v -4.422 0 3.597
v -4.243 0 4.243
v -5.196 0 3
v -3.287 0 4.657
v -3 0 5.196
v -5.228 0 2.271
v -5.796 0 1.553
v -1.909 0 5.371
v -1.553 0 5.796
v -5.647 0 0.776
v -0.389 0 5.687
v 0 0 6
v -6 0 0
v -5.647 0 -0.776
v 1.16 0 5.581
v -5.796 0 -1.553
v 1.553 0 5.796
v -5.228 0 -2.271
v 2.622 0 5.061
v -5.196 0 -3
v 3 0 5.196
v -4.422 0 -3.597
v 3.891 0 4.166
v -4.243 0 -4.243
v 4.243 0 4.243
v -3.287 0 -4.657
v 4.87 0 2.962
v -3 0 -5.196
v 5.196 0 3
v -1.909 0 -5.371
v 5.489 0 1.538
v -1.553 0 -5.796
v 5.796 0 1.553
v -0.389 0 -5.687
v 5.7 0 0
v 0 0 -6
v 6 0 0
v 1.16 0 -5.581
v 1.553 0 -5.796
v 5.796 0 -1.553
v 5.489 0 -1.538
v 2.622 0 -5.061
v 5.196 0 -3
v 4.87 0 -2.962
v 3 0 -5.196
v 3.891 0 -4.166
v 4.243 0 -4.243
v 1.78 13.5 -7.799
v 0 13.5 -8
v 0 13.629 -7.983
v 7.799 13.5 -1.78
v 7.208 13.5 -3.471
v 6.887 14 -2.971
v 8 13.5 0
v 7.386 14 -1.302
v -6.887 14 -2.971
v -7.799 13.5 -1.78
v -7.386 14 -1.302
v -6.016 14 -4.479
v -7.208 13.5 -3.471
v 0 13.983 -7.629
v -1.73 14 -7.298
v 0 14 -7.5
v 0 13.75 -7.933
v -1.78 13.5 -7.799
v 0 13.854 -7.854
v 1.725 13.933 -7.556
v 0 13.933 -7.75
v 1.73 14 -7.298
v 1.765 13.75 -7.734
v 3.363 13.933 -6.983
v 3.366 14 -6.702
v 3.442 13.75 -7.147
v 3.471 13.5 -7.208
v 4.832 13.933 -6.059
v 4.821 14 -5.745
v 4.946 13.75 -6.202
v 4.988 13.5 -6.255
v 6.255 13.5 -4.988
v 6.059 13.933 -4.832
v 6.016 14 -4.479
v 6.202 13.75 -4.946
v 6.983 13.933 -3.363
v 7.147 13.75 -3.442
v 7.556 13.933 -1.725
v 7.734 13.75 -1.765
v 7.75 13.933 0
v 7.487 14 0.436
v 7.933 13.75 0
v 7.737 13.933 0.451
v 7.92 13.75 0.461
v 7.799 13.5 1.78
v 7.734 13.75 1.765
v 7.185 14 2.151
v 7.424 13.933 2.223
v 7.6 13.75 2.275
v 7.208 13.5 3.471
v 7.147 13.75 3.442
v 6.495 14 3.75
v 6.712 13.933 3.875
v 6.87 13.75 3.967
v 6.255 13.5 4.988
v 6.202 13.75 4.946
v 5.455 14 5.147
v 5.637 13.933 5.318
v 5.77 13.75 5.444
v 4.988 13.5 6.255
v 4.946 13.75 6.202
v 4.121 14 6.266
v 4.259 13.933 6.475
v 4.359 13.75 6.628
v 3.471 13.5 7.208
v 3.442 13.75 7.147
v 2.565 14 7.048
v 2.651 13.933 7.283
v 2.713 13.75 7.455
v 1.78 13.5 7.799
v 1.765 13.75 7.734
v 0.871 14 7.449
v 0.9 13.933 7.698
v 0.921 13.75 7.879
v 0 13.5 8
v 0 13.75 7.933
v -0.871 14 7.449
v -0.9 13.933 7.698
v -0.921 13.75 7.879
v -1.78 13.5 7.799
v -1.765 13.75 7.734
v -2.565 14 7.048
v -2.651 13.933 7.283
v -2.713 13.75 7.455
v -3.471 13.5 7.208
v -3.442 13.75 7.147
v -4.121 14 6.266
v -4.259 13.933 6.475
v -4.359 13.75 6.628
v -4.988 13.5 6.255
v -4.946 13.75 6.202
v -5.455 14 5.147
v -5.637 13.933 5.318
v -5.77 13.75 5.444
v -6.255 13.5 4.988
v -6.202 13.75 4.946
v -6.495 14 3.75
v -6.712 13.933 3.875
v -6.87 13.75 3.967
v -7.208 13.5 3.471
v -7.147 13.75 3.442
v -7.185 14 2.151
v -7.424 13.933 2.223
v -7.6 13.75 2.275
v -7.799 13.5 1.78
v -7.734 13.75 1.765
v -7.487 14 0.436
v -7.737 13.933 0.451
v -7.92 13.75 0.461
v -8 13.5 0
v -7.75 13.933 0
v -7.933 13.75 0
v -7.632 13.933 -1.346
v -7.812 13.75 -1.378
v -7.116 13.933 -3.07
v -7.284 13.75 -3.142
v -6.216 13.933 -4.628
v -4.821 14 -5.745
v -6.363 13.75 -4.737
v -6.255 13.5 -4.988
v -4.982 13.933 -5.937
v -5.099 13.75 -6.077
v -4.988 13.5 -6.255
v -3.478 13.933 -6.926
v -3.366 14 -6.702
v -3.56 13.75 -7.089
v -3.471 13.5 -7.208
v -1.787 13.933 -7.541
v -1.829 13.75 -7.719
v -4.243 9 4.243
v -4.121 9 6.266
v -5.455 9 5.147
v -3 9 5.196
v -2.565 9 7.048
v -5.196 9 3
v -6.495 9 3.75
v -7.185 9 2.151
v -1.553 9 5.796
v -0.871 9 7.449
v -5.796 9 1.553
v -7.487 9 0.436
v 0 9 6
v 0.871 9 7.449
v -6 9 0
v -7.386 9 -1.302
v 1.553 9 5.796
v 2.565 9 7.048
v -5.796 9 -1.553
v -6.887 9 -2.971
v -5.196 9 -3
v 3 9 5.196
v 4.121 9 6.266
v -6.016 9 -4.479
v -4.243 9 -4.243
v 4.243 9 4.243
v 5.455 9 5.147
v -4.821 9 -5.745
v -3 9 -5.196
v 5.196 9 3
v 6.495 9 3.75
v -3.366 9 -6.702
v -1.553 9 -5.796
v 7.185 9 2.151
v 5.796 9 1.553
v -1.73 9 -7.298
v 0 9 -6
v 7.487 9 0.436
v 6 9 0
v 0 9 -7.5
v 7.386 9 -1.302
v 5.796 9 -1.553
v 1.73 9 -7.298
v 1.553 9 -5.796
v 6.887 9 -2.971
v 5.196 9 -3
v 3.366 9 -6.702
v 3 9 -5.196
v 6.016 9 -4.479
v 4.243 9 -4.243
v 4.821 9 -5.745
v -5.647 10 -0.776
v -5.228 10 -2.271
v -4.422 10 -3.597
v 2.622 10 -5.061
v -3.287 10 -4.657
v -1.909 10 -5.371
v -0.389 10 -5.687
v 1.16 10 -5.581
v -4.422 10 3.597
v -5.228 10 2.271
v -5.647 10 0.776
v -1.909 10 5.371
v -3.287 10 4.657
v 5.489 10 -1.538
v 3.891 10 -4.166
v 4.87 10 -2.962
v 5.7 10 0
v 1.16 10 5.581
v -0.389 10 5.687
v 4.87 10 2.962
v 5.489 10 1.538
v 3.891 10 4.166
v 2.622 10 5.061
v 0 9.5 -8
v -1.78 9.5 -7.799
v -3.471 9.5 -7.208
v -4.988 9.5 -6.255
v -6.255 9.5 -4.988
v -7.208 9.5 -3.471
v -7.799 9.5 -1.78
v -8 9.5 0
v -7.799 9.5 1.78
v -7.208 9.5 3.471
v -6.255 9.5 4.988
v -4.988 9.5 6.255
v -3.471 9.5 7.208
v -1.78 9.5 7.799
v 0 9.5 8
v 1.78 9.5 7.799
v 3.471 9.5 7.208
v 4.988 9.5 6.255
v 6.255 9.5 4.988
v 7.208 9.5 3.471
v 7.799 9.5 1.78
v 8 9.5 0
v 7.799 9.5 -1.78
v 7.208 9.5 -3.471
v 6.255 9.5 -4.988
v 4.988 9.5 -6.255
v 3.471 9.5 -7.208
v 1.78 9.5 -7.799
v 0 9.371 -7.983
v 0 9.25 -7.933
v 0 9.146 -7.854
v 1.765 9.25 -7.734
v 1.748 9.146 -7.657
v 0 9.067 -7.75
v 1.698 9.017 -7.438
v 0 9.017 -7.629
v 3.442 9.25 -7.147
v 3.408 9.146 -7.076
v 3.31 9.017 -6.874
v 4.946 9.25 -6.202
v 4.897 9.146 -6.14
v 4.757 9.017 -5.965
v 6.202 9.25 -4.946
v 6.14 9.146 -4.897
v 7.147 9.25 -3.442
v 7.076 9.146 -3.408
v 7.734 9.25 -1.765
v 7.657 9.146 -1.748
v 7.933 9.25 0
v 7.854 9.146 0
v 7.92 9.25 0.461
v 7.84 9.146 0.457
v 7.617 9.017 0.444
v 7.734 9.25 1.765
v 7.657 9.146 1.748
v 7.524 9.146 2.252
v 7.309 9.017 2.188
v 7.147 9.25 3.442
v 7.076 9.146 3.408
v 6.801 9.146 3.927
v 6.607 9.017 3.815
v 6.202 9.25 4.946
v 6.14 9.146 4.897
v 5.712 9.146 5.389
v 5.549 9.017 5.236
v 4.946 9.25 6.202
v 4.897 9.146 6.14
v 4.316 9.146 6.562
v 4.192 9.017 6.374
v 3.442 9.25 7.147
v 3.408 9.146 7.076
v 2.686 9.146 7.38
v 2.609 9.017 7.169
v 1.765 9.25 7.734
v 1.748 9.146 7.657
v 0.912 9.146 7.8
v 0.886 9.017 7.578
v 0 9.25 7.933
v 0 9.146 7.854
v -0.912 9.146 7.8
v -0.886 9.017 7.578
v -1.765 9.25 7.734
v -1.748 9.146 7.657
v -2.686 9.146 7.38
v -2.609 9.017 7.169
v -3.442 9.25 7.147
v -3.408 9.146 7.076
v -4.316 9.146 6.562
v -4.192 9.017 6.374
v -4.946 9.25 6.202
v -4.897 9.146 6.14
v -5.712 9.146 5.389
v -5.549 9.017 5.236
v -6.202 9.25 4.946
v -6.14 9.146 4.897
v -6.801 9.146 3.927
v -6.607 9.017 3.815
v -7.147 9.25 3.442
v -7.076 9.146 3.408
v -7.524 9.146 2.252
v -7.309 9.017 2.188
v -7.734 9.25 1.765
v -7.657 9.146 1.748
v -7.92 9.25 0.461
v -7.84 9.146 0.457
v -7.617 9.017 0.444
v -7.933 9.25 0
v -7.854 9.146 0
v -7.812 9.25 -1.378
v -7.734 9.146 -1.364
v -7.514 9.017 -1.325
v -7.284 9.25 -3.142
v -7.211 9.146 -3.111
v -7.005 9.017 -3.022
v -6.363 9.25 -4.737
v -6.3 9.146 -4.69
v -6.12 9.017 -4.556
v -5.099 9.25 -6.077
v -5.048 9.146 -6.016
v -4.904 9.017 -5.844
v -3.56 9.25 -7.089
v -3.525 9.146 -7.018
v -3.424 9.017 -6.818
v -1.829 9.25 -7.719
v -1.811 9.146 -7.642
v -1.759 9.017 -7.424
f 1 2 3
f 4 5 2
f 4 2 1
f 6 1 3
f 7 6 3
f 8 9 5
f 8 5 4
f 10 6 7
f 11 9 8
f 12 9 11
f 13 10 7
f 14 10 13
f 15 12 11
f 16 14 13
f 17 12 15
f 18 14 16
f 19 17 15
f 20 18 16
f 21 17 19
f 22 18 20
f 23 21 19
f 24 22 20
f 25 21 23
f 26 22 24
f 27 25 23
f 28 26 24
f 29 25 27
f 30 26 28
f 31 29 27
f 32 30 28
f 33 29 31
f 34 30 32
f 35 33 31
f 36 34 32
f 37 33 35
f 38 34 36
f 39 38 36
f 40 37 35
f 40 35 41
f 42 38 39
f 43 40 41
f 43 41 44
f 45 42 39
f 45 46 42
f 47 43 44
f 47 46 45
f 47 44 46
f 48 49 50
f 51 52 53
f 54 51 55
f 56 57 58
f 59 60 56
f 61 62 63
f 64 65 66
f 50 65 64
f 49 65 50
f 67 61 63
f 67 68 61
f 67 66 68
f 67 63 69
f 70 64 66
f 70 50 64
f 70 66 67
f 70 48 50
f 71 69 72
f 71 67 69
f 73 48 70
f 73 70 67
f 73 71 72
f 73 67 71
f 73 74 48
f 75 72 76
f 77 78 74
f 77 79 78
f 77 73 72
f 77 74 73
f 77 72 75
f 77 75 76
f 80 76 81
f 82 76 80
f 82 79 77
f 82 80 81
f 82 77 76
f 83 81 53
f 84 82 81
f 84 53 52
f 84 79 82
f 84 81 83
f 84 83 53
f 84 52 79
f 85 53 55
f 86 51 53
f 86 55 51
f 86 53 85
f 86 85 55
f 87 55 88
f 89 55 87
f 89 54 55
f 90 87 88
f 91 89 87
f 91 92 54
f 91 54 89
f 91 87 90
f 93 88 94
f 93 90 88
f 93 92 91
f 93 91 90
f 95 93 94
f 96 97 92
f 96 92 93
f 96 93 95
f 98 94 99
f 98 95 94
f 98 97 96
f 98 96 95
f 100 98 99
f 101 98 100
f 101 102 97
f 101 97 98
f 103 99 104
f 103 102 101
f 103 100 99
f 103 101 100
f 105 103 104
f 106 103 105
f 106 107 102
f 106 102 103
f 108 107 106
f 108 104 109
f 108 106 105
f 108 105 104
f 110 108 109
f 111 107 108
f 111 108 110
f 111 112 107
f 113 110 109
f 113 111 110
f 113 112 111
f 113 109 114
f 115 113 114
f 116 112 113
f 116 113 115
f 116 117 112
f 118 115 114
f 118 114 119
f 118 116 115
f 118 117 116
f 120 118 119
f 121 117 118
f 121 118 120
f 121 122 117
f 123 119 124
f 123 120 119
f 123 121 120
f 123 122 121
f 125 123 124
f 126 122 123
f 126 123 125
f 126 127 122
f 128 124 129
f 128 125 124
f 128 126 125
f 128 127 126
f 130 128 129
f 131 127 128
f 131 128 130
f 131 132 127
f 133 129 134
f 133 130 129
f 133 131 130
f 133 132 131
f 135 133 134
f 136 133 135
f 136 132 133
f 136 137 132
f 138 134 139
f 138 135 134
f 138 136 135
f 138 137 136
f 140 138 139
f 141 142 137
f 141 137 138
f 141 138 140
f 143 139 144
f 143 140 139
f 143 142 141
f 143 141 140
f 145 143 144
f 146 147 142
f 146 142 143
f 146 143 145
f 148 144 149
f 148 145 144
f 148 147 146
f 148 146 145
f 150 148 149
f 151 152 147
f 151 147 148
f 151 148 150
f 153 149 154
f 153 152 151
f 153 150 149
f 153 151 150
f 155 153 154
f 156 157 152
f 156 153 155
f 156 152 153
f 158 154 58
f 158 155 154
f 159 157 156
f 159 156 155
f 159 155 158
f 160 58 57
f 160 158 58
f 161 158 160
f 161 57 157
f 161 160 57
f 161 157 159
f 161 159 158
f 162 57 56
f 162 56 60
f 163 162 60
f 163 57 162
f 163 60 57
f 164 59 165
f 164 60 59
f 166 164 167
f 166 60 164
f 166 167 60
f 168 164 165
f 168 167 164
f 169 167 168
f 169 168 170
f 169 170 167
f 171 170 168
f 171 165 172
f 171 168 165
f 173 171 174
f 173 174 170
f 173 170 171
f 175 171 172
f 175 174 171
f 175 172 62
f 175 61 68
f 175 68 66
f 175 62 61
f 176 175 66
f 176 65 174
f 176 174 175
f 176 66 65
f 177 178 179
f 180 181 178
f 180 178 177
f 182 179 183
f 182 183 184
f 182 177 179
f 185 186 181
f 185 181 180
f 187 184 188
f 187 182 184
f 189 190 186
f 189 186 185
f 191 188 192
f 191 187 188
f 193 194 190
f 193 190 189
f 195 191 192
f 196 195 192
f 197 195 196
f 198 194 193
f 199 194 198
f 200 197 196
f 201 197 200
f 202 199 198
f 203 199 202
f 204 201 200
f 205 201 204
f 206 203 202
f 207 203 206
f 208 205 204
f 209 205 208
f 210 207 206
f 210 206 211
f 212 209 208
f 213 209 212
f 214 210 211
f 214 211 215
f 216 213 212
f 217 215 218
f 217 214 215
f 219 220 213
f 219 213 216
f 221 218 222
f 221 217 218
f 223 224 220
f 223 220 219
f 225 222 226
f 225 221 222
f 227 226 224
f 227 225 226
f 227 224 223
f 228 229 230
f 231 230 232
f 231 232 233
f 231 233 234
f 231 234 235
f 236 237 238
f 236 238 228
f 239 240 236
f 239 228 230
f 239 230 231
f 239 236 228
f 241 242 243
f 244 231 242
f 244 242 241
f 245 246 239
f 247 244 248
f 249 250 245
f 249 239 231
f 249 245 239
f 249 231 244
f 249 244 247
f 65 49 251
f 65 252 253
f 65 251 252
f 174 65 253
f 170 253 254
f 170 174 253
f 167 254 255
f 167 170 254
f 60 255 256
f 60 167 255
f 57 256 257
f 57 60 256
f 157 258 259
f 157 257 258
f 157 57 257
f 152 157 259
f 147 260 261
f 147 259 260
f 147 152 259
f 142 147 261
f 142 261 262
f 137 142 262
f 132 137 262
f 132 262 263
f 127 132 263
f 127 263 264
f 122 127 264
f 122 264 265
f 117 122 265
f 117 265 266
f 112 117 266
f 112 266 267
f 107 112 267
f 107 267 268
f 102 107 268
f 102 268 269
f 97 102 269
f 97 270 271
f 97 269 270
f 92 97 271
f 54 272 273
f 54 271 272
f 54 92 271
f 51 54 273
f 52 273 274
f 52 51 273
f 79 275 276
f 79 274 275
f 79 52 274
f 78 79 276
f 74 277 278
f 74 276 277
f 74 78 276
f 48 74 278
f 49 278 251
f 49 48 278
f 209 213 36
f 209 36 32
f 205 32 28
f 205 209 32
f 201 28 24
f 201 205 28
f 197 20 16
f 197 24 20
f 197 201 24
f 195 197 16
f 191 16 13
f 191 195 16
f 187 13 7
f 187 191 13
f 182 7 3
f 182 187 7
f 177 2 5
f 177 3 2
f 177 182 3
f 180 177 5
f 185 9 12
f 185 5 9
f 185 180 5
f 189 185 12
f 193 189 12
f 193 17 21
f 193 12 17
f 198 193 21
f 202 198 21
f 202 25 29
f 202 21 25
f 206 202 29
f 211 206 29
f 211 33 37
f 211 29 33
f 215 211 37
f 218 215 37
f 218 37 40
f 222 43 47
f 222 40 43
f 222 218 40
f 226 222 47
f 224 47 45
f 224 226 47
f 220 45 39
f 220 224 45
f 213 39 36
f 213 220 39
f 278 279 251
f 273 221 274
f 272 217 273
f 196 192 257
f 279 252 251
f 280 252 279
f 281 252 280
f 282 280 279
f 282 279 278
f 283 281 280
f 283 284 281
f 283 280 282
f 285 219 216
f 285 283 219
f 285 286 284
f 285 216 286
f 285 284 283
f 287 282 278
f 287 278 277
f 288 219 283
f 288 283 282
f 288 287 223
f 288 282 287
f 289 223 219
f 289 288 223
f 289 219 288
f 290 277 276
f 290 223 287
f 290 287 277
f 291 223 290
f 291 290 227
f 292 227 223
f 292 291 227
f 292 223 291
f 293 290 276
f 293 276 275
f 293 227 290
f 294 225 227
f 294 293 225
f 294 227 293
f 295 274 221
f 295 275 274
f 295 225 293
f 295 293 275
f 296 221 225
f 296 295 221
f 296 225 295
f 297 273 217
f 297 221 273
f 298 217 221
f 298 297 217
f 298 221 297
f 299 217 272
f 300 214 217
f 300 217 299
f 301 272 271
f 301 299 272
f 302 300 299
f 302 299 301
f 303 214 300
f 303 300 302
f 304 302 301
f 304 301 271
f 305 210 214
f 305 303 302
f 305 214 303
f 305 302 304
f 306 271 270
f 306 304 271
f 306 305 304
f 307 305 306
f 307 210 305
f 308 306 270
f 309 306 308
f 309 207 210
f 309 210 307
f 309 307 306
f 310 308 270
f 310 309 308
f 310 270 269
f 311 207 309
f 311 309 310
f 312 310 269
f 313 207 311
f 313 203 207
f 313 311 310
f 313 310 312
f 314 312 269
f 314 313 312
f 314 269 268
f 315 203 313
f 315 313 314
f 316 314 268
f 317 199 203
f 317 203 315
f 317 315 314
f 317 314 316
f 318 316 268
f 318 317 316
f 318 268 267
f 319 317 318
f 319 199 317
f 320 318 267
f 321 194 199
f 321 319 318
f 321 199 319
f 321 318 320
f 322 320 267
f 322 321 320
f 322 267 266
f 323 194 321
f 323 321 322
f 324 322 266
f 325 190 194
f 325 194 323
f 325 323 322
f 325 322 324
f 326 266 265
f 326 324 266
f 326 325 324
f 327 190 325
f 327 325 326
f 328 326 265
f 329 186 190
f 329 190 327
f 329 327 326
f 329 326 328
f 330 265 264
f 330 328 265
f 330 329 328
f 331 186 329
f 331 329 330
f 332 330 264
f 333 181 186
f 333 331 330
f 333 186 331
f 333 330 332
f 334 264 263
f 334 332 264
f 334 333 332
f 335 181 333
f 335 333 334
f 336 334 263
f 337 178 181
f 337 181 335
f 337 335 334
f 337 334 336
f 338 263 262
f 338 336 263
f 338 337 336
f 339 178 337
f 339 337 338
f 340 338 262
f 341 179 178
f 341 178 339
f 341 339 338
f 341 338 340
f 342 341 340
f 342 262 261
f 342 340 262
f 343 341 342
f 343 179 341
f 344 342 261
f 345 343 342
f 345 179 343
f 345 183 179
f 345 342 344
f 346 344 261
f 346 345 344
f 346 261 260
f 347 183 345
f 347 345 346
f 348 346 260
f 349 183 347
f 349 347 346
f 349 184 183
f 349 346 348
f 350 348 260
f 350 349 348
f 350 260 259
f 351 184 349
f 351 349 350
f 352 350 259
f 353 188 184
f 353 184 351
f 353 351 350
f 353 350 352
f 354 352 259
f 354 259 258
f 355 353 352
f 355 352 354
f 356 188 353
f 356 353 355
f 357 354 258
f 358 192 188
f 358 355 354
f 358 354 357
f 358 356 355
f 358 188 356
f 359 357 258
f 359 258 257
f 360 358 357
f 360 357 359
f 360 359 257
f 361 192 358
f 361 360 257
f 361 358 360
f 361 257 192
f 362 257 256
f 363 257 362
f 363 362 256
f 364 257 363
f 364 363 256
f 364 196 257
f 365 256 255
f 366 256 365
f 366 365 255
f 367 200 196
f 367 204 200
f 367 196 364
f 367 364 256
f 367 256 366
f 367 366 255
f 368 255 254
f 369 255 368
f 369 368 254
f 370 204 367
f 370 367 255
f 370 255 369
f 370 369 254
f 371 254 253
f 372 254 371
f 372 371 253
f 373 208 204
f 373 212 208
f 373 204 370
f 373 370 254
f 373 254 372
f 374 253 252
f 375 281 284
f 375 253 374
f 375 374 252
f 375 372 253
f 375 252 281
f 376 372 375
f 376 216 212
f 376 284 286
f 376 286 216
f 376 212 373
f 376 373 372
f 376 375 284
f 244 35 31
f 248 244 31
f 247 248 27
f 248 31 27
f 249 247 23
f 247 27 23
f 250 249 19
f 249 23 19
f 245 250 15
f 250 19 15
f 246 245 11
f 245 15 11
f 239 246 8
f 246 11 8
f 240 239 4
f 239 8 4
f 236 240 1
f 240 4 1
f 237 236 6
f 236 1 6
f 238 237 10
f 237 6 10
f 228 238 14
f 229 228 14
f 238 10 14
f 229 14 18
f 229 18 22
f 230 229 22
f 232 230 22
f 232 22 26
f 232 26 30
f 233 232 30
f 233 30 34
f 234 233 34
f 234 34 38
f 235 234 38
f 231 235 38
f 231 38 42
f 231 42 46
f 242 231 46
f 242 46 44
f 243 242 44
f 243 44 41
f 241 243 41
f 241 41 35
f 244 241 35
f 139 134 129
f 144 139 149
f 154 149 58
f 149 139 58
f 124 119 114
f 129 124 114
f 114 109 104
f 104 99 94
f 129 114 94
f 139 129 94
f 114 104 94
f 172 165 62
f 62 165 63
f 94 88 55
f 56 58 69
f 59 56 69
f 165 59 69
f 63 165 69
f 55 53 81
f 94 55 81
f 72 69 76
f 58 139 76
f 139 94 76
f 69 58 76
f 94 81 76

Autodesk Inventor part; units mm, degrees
ref_plane "YZ Plane" through (0, 0, 0) normal (1, 0, 0) x (0, 1, 0)
ref_plane "XZ Plane" through (0, 0, 0) normal (0, 1, 0) x (-1, 0, 0)
ref_plane "XY Plane" through (0, 0, 0) normal (0, 0, 1) x (1, 0, 0)
sketch "Szkic2" plane through (0, 0, 0) normal (1, 0, 0) x (0, 1, 0)
  line L0 (0, 0) -> (0, -6)
  line L1 (0, -6) -> (9, -6)
  line L2 (9, -6) -> (9, -8)
  line L3 (9, -8) -> (14, -8)
  line L4 (14, -8) -> (14, 0)
  line L5 (14, 0) -> (0, 0)
  dimension "d6" = 6
  dimension "d7" = 9
  dimension "d8" = 2
  dimension "d9" = 5
revolve "Obrót1" add sketch "Szkic2" angle 360 about axis through (0, 14, 0) along (0, -1, 0)
sketch "Szkic3" plane through (0, 0, 0) normal (0, -1, 0) x (1, 0, 0)
  circle A0 centre (0, 0) radius 6 projected
  circle A1 centre (0, 0) radius 5.7
  dimension "d11" = 11.4
extrude "Wyciągnięcie proste1" cut sketch "Szkic3" against normal blind 10 contours A1
fillet "Zaokrąglenie1" radius 0.5 2 edges at (0, 9, 8) (0, 14, 8)
properties material "Kauczuk"
